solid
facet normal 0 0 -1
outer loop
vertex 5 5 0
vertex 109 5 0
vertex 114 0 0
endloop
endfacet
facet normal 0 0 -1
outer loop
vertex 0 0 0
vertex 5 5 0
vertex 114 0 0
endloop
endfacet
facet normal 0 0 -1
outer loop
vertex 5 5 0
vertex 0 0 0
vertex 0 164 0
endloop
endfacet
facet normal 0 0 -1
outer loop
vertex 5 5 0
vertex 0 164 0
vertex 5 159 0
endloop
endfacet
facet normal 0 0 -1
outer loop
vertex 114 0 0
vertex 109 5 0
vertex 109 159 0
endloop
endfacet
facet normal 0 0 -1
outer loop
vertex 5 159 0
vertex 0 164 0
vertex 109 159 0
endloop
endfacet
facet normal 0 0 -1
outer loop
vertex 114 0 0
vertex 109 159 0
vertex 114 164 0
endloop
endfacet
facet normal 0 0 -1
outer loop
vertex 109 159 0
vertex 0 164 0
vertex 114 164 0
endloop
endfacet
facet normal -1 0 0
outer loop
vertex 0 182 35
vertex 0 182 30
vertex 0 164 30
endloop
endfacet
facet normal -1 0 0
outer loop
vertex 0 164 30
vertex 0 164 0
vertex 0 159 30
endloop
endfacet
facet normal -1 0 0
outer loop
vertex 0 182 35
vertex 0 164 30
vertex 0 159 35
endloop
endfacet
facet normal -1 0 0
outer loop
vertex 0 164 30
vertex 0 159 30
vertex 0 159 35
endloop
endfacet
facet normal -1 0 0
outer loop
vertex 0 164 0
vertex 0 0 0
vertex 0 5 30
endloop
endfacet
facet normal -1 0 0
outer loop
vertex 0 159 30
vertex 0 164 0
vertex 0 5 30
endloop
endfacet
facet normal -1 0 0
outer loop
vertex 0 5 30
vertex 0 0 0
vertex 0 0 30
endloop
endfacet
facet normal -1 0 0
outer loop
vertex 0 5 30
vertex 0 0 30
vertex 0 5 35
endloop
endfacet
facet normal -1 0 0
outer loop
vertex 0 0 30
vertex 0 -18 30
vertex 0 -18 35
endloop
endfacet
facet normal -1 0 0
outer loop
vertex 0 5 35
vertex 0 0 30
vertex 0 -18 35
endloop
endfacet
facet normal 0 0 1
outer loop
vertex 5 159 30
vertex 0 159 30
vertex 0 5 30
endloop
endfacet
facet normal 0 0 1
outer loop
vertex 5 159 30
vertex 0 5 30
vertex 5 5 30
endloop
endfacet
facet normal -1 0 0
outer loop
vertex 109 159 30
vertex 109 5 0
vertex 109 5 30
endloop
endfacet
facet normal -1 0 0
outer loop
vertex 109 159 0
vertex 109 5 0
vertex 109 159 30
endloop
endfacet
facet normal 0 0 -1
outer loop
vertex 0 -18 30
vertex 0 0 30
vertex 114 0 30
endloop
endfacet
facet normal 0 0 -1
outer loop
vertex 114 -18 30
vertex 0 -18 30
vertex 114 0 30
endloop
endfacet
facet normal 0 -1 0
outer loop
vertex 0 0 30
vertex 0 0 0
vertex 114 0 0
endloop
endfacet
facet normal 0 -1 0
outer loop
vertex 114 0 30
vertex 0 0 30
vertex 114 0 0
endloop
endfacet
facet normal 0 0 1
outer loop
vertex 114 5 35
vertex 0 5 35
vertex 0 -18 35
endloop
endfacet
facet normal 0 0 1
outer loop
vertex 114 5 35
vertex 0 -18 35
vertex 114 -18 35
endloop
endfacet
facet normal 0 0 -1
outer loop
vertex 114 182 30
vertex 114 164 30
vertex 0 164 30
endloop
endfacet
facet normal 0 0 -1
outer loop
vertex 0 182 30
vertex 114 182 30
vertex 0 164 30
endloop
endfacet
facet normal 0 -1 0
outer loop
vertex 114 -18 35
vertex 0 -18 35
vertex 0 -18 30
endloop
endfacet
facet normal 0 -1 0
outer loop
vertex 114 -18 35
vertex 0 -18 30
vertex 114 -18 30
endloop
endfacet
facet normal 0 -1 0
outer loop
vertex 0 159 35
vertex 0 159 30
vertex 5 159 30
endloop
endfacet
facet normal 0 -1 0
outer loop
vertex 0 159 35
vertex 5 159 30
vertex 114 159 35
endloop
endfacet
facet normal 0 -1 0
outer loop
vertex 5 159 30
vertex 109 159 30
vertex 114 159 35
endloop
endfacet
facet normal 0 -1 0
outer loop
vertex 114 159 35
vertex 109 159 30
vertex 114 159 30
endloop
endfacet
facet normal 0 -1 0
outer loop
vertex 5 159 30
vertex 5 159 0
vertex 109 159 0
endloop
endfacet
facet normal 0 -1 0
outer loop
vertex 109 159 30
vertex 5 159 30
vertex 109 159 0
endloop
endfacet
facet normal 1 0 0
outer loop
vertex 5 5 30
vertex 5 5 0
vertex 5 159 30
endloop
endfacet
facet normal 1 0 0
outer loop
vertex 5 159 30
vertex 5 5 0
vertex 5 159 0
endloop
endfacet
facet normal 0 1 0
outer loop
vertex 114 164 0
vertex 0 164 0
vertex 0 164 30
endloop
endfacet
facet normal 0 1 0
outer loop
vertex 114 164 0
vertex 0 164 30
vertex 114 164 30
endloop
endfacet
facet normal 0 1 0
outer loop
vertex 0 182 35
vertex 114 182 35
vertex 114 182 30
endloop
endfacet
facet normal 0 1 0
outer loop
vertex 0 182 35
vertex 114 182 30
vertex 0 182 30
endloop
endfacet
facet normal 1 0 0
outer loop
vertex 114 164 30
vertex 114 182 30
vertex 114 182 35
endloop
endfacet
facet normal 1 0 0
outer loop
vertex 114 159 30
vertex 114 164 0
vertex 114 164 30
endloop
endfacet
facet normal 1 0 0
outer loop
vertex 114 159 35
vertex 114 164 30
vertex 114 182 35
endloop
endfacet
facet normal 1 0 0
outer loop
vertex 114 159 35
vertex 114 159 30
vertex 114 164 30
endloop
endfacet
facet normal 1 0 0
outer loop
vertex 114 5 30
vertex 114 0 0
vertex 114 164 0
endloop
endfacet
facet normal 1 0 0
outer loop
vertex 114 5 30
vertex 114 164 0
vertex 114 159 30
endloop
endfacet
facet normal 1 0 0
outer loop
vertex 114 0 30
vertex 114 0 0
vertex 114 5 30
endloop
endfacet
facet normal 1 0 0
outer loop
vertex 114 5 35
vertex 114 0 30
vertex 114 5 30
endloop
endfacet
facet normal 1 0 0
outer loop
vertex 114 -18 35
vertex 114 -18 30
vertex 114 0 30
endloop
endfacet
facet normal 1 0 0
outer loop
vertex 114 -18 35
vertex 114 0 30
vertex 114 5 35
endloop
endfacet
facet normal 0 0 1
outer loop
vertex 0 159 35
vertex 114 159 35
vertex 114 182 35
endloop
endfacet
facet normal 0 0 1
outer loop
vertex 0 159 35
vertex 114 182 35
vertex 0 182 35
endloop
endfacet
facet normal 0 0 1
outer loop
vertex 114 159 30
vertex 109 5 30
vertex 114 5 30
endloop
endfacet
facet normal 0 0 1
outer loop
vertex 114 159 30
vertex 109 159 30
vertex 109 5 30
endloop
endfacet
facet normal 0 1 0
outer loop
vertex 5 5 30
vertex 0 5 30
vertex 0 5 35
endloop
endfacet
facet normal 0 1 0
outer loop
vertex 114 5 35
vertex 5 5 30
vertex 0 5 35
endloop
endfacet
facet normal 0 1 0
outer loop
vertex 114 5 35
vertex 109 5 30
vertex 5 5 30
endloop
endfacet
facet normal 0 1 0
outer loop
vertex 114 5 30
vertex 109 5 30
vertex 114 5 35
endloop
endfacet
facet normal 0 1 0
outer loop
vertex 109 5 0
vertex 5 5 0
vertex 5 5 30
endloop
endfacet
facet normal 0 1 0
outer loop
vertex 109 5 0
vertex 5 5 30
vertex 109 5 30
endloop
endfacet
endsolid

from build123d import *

# Parameters (mm, degrees)
SKETCH001_W   = 114
SKETCH001_H   = 5
SKETCH001_W_2 = 5
SKETCH001_H_2 = 154
PAD001_DEPTH  = 30
SKETCH_W      = 114
SKETCH_H      = 5
PAD_DEPTH     = 5
SKETCH002_W   = 114
SKETCH002_H   = 5
PAD002_DEPTH  = 18
SKETCH003_W   = 114
SKETCH003_H   = 5
PAD003_DEPTH  = 18


with BuildPart() as part:
    # Sketch001 → Pad001 (new body)
    with BuildSketch(Plane.XY):
        with Locations((57, 2.5)):
            Rectangle(SKETCH001_W, SKETCH001_H)
        with Locations((2.5, 82)):
            Rectangle(SKETCH001_W_2, SKETCH001_H_2)
        with Locations((111.5, 82)):
            Rectangle(SKETCH001_W_2, SKETCH001_H_2)
        with Locations((57, 161.5)):
            Rectangle(SKETCH001_W, SKETCH001_H)
    extrude(amount=PAD001_DEPTH)

    # Sketch → Pad (new body)
    with BuildSketch(Plane.XY.offset(30)):
        with Locations((57, 161.5)):
            Rectangle(SKETCH_W, SKETCH_H)
        with Locations((57, 2.5)):
            Rectangle(SKETCH_W, SKETCH_H)
    extrude(amount=PAD_DEPTH)

    # Sketch002 → Pad002 (new body)
    with BuildSketch(Plane.XZ):
        with Locations((57, 32.5)):
            Rectangle(SKETCH002_W, SKETCH002_H)
    extrude(amount=PAD002_DEPTH)

    # Sketch003 → Pad003 (new body)
    with BuildSketch(Plane(origin=(0, 164, 0), x_dir=(-1, 0, 0), z_dir=(0, 1, 0))):
        with Locations((-57, 32.5)):
            Rectangle(SKETCH003_W, SKETCH003_H)
    extrude(amount=PAD003_DEPTH)


solid = part.part
